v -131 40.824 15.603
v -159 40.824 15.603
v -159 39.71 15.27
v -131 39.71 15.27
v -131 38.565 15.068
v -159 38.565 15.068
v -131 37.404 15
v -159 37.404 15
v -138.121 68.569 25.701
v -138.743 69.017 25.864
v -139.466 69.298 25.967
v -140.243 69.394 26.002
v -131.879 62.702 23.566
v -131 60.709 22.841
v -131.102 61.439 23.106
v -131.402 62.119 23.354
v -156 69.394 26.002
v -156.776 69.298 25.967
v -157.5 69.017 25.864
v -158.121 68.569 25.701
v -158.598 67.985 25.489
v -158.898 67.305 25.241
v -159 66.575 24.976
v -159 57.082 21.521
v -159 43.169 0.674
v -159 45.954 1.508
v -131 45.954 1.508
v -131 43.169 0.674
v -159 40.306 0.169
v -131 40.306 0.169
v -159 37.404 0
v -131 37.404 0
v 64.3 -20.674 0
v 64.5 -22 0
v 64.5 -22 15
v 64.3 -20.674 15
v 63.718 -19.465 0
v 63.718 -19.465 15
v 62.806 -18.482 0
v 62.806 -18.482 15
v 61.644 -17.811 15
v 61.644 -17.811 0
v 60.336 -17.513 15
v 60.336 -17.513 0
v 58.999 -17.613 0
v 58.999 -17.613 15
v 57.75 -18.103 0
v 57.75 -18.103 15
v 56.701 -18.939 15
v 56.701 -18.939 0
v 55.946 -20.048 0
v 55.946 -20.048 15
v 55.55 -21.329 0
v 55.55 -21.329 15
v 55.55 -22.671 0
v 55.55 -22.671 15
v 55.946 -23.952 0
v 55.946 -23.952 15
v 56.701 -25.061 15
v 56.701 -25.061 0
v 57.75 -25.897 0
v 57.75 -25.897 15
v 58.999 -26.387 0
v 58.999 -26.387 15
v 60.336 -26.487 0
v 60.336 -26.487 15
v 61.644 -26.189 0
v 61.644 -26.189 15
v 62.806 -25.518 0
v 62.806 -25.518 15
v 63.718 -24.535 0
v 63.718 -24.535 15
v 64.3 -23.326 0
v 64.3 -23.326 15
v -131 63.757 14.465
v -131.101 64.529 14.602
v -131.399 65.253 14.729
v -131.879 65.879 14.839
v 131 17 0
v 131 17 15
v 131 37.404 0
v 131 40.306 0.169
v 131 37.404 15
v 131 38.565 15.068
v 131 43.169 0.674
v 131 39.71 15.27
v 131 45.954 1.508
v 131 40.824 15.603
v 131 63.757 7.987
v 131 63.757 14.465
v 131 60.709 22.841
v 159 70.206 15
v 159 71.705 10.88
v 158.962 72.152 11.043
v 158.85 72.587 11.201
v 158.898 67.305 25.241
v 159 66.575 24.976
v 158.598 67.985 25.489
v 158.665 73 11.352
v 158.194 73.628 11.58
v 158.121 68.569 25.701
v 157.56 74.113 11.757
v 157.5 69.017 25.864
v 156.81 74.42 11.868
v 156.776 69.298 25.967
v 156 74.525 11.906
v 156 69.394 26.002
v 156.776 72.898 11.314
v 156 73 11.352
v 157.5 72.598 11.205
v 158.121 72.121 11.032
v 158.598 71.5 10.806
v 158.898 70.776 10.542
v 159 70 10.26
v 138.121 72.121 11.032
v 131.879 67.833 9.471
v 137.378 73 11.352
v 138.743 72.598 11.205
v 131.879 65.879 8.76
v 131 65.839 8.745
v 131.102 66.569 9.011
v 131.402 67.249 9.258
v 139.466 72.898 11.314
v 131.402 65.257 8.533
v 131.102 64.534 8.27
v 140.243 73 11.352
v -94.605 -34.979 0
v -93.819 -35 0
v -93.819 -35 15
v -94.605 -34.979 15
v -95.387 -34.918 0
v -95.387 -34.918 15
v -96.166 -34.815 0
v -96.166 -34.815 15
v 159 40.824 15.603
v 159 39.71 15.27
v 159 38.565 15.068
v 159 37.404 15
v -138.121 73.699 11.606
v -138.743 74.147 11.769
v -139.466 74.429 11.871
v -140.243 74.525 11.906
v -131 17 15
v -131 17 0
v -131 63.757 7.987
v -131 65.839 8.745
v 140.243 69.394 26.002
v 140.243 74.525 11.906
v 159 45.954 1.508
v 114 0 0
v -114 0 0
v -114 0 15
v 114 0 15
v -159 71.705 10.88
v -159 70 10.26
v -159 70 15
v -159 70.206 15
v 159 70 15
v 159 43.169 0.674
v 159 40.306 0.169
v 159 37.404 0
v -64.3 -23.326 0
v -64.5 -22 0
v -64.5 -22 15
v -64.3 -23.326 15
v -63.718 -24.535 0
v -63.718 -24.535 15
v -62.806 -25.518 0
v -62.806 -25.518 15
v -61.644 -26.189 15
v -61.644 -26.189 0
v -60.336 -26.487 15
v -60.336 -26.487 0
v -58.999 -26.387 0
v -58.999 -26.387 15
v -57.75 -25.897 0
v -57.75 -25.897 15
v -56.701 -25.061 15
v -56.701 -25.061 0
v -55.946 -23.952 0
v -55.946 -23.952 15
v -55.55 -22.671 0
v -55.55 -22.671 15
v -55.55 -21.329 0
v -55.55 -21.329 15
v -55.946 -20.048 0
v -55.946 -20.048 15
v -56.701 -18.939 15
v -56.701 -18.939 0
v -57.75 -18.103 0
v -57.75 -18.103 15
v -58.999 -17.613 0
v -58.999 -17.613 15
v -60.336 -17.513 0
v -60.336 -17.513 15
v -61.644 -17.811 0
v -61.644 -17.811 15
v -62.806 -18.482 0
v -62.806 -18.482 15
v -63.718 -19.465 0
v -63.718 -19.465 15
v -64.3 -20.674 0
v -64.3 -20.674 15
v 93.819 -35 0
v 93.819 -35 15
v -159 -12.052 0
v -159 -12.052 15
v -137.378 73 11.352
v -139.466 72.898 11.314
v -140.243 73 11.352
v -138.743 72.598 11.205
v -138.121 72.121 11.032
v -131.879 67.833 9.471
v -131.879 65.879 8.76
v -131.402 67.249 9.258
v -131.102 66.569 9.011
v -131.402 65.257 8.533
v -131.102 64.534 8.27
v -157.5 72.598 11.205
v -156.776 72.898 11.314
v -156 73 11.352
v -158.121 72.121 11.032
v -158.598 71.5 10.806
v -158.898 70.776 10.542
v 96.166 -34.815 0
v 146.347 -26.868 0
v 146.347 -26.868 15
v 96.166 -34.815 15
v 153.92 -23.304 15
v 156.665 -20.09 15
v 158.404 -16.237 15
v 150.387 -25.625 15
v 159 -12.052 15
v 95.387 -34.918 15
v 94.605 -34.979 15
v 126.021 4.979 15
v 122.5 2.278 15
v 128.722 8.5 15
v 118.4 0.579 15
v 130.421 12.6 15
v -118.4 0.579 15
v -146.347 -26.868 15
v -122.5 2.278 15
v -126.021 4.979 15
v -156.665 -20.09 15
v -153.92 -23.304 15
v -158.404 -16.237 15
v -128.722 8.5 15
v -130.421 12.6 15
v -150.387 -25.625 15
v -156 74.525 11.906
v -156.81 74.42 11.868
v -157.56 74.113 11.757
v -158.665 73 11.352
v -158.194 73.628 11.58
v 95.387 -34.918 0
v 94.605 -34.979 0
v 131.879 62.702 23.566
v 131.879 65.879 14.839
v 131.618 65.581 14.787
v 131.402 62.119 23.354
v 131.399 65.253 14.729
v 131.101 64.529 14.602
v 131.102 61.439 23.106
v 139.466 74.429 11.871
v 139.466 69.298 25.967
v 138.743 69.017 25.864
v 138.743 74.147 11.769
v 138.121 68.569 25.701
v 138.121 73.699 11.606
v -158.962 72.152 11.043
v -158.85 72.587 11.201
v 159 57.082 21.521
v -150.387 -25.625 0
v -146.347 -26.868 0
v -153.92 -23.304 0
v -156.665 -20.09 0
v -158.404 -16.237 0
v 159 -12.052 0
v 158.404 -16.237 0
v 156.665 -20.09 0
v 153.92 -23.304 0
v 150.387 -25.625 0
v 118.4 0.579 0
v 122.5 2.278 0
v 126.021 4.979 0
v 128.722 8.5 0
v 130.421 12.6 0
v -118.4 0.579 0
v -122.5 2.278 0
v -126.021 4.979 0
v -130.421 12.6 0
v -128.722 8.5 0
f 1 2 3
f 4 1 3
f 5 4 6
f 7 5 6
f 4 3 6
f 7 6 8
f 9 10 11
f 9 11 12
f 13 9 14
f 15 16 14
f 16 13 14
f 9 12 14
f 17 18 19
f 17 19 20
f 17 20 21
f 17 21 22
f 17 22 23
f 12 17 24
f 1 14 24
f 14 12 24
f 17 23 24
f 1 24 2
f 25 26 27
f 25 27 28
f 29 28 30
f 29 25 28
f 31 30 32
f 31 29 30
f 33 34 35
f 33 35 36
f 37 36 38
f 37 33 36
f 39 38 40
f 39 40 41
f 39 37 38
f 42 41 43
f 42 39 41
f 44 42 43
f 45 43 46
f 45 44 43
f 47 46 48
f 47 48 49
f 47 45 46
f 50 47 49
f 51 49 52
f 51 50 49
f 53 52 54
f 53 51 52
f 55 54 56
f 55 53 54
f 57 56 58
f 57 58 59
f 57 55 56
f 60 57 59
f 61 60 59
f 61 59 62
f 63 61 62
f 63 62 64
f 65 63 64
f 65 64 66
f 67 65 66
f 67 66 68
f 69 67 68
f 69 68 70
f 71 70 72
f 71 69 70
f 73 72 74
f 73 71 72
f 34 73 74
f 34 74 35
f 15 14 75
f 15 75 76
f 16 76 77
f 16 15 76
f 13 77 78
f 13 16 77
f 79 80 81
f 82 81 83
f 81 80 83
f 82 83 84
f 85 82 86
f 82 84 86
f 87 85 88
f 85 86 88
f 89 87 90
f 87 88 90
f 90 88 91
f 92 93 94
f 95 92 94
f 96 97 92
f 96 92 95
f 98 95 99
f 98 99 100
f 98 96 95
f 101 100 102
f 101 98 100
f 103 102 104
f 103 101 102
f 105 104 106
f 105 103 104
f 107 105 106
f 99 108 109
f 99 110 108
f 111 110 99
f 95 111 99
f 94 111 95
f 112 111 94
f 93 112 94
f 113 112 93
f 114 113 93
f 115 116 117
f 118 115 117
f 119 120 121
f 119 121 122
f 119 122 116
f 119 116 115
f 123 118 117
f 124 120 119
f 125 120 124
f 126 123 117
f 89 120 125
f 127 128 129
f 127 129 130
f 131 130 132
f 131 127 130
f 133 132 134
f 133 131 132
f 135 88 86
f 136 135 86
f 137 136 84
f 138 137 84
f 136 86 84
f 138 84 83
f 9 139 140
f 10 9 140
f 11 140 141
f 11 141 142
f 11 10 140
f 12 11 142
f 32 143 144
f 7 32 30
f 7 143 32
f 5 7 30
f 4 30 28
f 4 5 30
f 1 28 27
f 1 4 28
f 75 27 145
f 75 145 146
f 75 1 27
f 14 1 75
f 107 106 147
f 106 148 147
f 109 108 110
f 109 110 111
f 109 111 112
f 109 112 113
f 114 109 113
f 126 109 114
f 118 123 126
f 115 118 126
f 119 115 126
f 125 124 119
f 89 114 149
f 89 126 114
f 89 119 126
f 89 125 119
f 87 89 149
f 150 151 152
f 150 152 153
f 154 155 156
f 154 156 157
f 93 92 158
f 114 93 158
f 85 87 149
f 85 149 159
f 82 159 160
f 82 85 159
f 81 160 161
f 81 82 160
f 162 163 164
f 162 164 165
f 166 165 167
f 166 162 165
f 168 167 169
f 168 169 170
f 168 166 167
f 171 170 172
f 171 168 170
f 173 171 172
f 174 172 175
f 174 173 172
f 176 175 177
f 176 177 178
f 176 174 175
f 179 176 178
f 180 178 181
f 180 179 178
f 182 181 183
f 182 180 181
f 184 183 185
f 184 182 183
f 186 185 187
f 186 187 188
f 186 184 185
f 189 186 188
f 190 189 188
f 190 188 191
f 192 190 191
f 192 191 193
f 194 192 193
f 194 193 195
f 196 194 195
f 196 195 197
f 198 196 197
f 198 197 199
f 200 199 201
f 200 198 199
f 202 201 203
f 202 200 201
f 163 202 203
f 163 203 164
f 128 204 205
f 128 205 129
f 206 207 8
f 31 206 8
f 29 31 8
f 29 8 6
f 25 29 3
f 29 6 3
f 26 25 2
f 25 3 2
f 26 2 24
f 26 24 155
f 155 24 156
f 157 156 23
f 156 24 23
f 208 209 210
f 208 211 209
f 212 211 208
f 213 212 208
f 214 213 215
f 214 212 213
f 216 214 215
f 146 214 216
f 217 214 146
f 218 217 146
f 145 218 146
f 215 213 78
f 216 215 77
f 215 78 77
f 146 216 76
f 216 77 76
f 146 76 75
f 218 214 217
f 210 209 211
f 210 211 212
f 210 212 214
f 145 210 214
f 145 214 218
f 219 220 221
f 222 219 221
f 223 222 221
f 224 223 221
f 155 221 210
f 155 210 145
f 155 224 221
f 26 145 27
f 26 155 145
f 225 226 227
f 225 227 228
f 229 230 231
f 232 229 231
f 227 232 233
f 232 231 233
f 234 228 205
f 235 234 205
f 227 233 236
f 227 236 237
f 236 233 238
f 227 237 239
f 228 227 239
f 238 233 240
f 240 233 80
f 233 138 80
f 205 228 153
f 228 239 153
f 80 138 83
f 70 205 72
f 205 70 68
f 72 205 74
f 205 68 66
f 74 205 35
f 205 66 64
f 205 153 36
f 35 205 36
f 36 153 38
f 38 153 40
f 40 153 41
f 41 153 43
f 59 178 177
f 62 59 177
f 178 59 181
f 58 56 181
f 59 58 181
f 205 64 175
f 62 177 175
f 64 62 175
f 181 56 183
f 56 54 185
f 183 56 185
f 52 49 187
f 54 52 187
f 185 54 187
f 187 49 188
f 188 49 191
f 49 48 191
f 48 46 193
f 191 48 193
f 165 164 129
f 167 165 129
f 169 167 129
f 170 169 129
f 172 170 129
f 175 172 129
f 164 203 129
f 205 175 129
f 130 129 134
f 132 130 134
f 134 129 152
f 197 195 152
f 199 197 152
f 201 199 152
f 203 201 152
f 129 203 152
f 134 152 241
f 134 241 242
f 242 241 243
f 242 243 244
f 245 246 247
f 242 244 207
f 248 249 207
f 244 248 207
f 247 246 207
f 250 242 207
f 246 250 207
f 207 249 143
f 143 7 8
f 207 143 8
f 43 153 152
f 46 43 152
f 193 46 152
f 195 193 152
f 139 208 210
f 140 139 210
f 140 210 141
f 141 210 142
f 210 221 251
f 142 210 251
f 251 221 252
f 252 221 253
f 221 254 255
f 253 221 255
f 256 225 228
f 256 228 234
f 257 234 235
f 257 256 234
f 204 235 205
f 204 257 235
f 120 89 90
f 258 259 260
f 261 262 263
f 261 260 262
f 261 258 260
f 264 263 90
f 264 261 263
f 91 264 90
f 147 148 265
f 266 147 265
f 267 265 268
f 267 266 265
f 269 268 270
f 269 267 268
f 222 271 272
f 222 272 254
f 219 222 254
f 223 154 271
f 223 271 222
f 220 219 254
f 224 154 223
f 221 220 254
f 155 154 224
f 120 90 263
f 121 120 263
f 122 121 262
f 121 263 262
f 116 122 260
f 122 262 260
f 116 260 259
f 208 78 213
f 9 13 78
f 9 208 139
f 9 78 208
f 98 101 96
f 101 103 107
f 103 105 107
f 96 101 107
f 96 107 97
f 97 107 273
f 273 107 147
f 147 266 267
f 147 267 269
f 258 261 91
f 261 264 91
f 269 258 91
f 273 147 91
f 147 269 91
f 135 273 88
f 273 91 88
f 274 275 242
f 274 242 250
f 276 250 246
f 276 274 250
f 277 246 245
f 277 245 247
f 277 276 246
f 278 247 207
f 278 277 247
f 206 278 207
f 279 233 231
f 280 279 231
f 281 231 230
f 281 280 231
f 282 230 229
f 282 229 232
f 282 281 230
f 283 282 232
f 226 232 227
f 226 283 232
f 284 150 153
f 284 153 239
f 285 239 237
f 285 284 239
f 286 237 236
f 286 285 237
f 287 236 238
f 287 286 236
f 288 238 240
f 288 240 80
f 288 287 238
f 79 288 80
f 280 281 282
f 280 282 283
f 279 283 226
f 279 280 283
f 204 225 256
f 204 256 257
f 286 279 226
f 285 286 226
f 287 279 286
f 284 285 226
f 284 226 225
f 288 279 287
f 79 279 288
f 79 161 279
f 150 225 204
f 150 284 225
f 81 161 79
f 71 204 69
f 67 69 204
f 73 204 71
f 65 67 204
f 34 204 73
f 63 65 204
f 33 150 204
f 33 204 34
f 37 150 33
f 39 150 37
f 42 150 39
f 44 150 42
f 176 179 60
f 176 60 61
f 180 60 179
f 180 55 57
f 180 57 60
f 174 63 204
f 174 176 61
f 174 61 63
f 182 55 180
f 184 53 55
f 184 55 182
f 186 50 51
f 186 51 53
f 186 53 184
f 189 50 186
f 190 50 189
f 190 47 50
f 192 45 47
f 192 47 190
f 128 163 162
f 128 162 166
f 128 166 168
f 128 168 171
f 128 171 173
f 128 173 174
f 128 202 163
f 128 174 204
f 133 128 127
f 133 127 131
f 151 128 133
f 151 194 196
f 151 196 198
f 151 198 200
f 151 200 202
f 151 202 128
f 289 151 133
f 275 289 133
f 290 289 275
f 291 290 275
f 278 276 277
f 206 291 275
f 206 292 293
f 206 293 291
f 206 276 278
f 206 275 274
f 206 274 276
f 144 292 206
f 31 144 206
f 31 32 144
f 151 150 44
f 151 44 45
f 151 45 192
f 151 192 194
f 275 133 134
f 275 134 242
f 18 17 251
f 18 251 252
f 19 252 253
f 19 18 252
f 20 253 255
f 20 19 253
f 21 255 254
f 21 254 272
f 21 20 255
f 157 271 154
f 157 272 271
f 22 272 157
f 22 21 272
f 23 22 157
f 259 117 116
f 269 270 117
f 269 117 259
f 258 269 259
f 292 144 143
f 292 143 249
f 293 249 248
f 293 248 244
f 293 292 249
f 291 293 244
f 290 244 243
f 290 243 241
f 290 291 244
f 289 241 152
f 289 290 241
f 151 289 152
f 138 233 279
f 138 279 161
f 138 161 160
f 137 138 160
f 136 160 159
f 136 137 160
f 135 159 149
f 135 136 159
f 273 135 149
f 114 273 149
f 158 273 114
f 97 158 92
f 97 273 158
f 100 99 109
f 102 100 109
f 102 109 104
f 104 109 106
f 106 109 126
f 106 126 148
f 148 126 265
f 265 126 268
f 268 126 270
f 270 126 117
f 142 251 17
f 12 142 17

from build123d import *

# Parameters (mm, degrees)
SKETCH1_R              = 4.5
EXTRUDE1_DEPTH         = 15
PROCESS_BENDS1_START   = -159
PROCESS_BENDS1_DEPTH   = 318
PROCESS_BENDS1_2_DEPTH = 28
PROCESS_BENDS1_START_2 = 131
PROCESS_BENDS1_3_DEPTH = 28
PROCESS_BENDS1_START_3 = -0.699454706
PROCESS_BENDS1_4_DEPTH = 14.999999999
PROCESS_BENDS1_START_4 = 7.710911858
PROCESS_BENDS1_5_DEPTH = 6.589633435


with BuildPart() as part:
    # Sketch1 → Extrude1 (new body)
    with BuildSketch(Plane.XY):
        with BuildLine():
            Line((-114, 0), (114, 0))
            ThreePointArc((114, 0), (126.02081528, 4.97918472), (131, 17))
            Line((131, 17), (131, 63.757359313))
            ThreePointArc((131, 63.757359313), (131.228361402, 64.90540961), (131.878679656, 65.878679656))
            Line((131.878679656, 65.878679656), (138.121320344, 72.121320344))
            ThreePointArc((138.121320344, 72.121320344), (139.09459039, 72.771638598), (140.242640687, 73))
            Line((140.242640687, 73), (156, 73))
            ThreePointArc((156, 73), (158.121320344, 72.121320344), (159, 70))
            Line((159, 70), (159, -12.052185537))
            ThreePointArc((159, -12.052185537), (155.406089484, -21.793906262), (146.346516976, -26.867510646))
            Line((146.346516976, -26.867510646), (96.165991373, -34.815325109))
            ThreePointArc((96.165991373, -34.815325109), (94.996360834, -34.953760006), (93.819474398, -35))
            Line((93.819474398, -35), (-93.819474398, -35))
            ThreePointArc((-93.819474398, -35), (-94.996360834, -34.953760006), (-96.165991373, -34.815325109))
            Line((-96.165991373, -34.815325109), (-146.346516976, -26.867510646))
            ThreePointArc((-146.346516976, -26.867510646), (-155.406089484, -21.793906262), (-159, -12.052185537))
            Line((-159, -12.052185537), (-159, 70))
            ThreePointArc((-159, 70), (-158.121320344, 72.121320344), (-156, 73))
            Line((-156, 73), (-140.242640687, 73))
            ThreePointArc((-140.242640687, 73), (-139.09459039, 72.771638598), (-138.121320344, 72.121320344))
            Line((-138.121320344, 72.121320344), (-131.878679656, 65.878679656))
            ThreePointArc((-131.878679656, 65.878679656), (-131.228361402, 64.90540961), (-131, 63.757359313))
            Line((-131, 63.757359313), (-131, 17))
            ThreePointArc((-131, 17), (-126.02081528, 4.97918472), (-114, 0))
        make_face()
        with Locations((60, -22)):
            Circle(SKETCH1_R, mode=Mode.SUBTRACT)
        with Locations(Location((-60, -22, 0), (0, 0, 180))):
            Circle(SKETCH1_R, mode=Mode.SUBTRACT)
    extrude(amount=EXTRUDE1_DEPTH)

    # Process-Bends1: read off the stored shape, not the designer's step
    # Process-Bends1 outline → Process-Bends1 (cut)
    with BuildSketch(Plane.YZ.offset(PROCESS_BENDS1_START)):
        with BuildLine():
            Line((73, 0), (73, 11.351504666))
            Line((73, 11.351504666), (45.954326321, 1.50768448))
            ThreePointArc((45.954326321, 1.50768448), (41.745027179, 0.379806175), (37.403822738, 0))
            Line((37.403822738, 0), (73, 0))
        make_face()
    extrude(amount=PROCESS_BENDS1_DEPTH, mode=Mode.SUBTRACT)

    # Process-Bends1 2 outline → Process-Bends1 2 (add)
    with BuildSketch(Plane.YZ.offset(PROCESS_BENDS1_START)):
        with BuildLine():
            Line((74.524574191, 11.906404291), (69.394272041, 26.001793603))
            Line((69.394272041, 26.001793603), (40.824024171, 15.603073792))
            ThreePointArc((40.824024171, 15.603073792), (39.140304514, 15.15192247), (37.403822738, 15))
            Line((37.403822738, 15), (73, 15))
            Line((73, 15), (73, 11.351504666))
            Line((73, 11.351504666), (74.524574191, 11.906404291))
        make_face()
    extrude(amount=PROCESS_BENDS1_2_DEPTH)

    # Process-Bends1 3 outline → Process-Bends1 3 (add)
    with BuildSketch(Plane.YZ.offset(PROCESS_BENDS1_START_2)):
        with BuildLine():
            Line((74.524574191, 11.906404291), (69.394272041, 26.001793603))
            Line((69.394272041, 26.001793603), (40.824024171, 15.603073792))
            ThreePointArc((40.824024171, 15.603073792), (39.140304514, 15.15192247), (37.403822738, 15))
            Line((37.403822738, 15), (73, 15))
            Line((73, 15), (73, 11.351504666))
            Line((73, 11.351504666), (74.524574191, 11.906404291))
        make_face()
    extrude(amount=PROCESS_BENDS1_3_DEPTH)

    # Process-Bends1 4 outline → Process-Bends1 4 (cut)
    with BuildSketch(Plane(origin=(0, 0, 0), x_dir=(1, 0, 0), z_dir=(0, 0.34202014332567, -0.939692620785908)).offset(PROCESS_BENDS1_START_3)):
        with BuildLine():
            ThreePointArc((140.242640687, -74.102422537), (139.09459039, -73.874061134), (138.121320344, -73.22374288))
            Line((138.121320344, -73.22374288), (131.878679656, -66.981102193))
            ThreePointArc((131.878679656, -66.981102193), (131.228361402, -66.007832146), (131, -64.859781849))
            Line((131, -64.859781849), (131, -74.102422537))
            Line((131, -74.102422537), (140.242640687, -74.102422537))
        make_face()
        with BuildLine():
            ThreePointArc((159, -71.102422537), (158.121320344, -73.22374288), (156, -74.102422537))
            Line((156, -74.102422537), (159, -74.102422537))
            Line((159, -74.102422537), (160, -74.102422548))
            Line((160, -74.102422548), (160, -61))
            Line((160, -61), (159.000000001, -61))
            Line((159.000000001, -61), (159, -71.102422537))
        make_face()
        with BuildLine():
            Line((-140.242640687, -74.102422537), (-131, -74.102422537))
            Line((-131, -74.102422537), (-131, -64.859781849))
            ThreePointArc((-131, -64.859781849), (-131.228361402, -66.007832146), (-131.878679656, -66.981102193))
            Line((-131.878679656, -66.981102193), (-138.121320344, -73.22374288))
            ThreePointArc((-138.121320344, -73.22374288), (-139.09459039, -73.874061134), (-140.242640687, -74.102422537))
        make_face()
        with BuildLine():
            Line((-159, -74.102422537), (-156, -74.102422537))
            ThreePointArc((-156, -74.102422537), (-158.121320344, -73.22374288), (-159, -71.102422537))
            Line((-159, -71.102422537), (-159.000000001, -61))
            Line((-159.000000001, -61), (-160, -61))
            Line((-160, -61), (-160, -74.102422548))
            Line((-160, -74.102422548), (-159, -74.102422537))
        make_face()
    extrude(amount=PROCESS_BENDS1_4_DEPTH, mode=Mode.SUBTRACT)

    # Process-Bends1 5 outline → Process-Bends1 5 (add)
    with BuildSketch(Plane(origin=(0, 0, 0), x_dir=(1, 0, 0), z_dir=(0, 0.34202014332567, -0.939692620785908)).offset(PROCESS_BENDS1_START_4)):
        with BuildLine():
            Line((131.878679656, -66.981102193), (138.121320344, -73.22374288))
            ThreePointArc((138.121320344, -73.22374288), (139.09459039, -73.874061134), (140.242640687, -74.102422537))
            Line((140.242640687, -74.102422537), (156, -74.102422537))
            ThreePointArc((156, -74.102422537), (158.121320344, -73.22374288), (159, -71.102422537))
            Line((159, -71.102422537), (159.000000001, -61))
            Line((159.000000001, -61), (131.000000004, -61))
            Line((131.000000004, -61), (131, -64.859781849))
            ThreePointArc((131, -64.859781849), (131.228361402, -66.007832146), (131.878679656, -66.981102193))
        make_face()
        with BuildLine():
            ThreePointArc((-131.878679656, -66.981102193), (-131.228361402, -66.007832146), (-131, -64.859781849))
            Line((-131, -64.859781849), (-131, -61))
            Line((-131, -61), (-159.000000001, -61))
            Line((-159.000000001, -61), (-159, -71.102422537))
            ThreePointArc((-159, -71.102422537), (-158.121320344, -73.22374288), (-156, -74.102422537))
            Line((-156, -74.102422537), (-140.242640687, -74.102422537))
            ThreePointArc((-140.242640687, -74.102422537), (-139.09459039, -73.874061134), (-138.121320344, -73.22374288))
            Line((-138.121320344, -73.22374288), (-131.878679656, -66.981102193))
        make_face()
    extrude(amount=PROCESS_BENDS1_5_DEPTH)


solid = part.part
